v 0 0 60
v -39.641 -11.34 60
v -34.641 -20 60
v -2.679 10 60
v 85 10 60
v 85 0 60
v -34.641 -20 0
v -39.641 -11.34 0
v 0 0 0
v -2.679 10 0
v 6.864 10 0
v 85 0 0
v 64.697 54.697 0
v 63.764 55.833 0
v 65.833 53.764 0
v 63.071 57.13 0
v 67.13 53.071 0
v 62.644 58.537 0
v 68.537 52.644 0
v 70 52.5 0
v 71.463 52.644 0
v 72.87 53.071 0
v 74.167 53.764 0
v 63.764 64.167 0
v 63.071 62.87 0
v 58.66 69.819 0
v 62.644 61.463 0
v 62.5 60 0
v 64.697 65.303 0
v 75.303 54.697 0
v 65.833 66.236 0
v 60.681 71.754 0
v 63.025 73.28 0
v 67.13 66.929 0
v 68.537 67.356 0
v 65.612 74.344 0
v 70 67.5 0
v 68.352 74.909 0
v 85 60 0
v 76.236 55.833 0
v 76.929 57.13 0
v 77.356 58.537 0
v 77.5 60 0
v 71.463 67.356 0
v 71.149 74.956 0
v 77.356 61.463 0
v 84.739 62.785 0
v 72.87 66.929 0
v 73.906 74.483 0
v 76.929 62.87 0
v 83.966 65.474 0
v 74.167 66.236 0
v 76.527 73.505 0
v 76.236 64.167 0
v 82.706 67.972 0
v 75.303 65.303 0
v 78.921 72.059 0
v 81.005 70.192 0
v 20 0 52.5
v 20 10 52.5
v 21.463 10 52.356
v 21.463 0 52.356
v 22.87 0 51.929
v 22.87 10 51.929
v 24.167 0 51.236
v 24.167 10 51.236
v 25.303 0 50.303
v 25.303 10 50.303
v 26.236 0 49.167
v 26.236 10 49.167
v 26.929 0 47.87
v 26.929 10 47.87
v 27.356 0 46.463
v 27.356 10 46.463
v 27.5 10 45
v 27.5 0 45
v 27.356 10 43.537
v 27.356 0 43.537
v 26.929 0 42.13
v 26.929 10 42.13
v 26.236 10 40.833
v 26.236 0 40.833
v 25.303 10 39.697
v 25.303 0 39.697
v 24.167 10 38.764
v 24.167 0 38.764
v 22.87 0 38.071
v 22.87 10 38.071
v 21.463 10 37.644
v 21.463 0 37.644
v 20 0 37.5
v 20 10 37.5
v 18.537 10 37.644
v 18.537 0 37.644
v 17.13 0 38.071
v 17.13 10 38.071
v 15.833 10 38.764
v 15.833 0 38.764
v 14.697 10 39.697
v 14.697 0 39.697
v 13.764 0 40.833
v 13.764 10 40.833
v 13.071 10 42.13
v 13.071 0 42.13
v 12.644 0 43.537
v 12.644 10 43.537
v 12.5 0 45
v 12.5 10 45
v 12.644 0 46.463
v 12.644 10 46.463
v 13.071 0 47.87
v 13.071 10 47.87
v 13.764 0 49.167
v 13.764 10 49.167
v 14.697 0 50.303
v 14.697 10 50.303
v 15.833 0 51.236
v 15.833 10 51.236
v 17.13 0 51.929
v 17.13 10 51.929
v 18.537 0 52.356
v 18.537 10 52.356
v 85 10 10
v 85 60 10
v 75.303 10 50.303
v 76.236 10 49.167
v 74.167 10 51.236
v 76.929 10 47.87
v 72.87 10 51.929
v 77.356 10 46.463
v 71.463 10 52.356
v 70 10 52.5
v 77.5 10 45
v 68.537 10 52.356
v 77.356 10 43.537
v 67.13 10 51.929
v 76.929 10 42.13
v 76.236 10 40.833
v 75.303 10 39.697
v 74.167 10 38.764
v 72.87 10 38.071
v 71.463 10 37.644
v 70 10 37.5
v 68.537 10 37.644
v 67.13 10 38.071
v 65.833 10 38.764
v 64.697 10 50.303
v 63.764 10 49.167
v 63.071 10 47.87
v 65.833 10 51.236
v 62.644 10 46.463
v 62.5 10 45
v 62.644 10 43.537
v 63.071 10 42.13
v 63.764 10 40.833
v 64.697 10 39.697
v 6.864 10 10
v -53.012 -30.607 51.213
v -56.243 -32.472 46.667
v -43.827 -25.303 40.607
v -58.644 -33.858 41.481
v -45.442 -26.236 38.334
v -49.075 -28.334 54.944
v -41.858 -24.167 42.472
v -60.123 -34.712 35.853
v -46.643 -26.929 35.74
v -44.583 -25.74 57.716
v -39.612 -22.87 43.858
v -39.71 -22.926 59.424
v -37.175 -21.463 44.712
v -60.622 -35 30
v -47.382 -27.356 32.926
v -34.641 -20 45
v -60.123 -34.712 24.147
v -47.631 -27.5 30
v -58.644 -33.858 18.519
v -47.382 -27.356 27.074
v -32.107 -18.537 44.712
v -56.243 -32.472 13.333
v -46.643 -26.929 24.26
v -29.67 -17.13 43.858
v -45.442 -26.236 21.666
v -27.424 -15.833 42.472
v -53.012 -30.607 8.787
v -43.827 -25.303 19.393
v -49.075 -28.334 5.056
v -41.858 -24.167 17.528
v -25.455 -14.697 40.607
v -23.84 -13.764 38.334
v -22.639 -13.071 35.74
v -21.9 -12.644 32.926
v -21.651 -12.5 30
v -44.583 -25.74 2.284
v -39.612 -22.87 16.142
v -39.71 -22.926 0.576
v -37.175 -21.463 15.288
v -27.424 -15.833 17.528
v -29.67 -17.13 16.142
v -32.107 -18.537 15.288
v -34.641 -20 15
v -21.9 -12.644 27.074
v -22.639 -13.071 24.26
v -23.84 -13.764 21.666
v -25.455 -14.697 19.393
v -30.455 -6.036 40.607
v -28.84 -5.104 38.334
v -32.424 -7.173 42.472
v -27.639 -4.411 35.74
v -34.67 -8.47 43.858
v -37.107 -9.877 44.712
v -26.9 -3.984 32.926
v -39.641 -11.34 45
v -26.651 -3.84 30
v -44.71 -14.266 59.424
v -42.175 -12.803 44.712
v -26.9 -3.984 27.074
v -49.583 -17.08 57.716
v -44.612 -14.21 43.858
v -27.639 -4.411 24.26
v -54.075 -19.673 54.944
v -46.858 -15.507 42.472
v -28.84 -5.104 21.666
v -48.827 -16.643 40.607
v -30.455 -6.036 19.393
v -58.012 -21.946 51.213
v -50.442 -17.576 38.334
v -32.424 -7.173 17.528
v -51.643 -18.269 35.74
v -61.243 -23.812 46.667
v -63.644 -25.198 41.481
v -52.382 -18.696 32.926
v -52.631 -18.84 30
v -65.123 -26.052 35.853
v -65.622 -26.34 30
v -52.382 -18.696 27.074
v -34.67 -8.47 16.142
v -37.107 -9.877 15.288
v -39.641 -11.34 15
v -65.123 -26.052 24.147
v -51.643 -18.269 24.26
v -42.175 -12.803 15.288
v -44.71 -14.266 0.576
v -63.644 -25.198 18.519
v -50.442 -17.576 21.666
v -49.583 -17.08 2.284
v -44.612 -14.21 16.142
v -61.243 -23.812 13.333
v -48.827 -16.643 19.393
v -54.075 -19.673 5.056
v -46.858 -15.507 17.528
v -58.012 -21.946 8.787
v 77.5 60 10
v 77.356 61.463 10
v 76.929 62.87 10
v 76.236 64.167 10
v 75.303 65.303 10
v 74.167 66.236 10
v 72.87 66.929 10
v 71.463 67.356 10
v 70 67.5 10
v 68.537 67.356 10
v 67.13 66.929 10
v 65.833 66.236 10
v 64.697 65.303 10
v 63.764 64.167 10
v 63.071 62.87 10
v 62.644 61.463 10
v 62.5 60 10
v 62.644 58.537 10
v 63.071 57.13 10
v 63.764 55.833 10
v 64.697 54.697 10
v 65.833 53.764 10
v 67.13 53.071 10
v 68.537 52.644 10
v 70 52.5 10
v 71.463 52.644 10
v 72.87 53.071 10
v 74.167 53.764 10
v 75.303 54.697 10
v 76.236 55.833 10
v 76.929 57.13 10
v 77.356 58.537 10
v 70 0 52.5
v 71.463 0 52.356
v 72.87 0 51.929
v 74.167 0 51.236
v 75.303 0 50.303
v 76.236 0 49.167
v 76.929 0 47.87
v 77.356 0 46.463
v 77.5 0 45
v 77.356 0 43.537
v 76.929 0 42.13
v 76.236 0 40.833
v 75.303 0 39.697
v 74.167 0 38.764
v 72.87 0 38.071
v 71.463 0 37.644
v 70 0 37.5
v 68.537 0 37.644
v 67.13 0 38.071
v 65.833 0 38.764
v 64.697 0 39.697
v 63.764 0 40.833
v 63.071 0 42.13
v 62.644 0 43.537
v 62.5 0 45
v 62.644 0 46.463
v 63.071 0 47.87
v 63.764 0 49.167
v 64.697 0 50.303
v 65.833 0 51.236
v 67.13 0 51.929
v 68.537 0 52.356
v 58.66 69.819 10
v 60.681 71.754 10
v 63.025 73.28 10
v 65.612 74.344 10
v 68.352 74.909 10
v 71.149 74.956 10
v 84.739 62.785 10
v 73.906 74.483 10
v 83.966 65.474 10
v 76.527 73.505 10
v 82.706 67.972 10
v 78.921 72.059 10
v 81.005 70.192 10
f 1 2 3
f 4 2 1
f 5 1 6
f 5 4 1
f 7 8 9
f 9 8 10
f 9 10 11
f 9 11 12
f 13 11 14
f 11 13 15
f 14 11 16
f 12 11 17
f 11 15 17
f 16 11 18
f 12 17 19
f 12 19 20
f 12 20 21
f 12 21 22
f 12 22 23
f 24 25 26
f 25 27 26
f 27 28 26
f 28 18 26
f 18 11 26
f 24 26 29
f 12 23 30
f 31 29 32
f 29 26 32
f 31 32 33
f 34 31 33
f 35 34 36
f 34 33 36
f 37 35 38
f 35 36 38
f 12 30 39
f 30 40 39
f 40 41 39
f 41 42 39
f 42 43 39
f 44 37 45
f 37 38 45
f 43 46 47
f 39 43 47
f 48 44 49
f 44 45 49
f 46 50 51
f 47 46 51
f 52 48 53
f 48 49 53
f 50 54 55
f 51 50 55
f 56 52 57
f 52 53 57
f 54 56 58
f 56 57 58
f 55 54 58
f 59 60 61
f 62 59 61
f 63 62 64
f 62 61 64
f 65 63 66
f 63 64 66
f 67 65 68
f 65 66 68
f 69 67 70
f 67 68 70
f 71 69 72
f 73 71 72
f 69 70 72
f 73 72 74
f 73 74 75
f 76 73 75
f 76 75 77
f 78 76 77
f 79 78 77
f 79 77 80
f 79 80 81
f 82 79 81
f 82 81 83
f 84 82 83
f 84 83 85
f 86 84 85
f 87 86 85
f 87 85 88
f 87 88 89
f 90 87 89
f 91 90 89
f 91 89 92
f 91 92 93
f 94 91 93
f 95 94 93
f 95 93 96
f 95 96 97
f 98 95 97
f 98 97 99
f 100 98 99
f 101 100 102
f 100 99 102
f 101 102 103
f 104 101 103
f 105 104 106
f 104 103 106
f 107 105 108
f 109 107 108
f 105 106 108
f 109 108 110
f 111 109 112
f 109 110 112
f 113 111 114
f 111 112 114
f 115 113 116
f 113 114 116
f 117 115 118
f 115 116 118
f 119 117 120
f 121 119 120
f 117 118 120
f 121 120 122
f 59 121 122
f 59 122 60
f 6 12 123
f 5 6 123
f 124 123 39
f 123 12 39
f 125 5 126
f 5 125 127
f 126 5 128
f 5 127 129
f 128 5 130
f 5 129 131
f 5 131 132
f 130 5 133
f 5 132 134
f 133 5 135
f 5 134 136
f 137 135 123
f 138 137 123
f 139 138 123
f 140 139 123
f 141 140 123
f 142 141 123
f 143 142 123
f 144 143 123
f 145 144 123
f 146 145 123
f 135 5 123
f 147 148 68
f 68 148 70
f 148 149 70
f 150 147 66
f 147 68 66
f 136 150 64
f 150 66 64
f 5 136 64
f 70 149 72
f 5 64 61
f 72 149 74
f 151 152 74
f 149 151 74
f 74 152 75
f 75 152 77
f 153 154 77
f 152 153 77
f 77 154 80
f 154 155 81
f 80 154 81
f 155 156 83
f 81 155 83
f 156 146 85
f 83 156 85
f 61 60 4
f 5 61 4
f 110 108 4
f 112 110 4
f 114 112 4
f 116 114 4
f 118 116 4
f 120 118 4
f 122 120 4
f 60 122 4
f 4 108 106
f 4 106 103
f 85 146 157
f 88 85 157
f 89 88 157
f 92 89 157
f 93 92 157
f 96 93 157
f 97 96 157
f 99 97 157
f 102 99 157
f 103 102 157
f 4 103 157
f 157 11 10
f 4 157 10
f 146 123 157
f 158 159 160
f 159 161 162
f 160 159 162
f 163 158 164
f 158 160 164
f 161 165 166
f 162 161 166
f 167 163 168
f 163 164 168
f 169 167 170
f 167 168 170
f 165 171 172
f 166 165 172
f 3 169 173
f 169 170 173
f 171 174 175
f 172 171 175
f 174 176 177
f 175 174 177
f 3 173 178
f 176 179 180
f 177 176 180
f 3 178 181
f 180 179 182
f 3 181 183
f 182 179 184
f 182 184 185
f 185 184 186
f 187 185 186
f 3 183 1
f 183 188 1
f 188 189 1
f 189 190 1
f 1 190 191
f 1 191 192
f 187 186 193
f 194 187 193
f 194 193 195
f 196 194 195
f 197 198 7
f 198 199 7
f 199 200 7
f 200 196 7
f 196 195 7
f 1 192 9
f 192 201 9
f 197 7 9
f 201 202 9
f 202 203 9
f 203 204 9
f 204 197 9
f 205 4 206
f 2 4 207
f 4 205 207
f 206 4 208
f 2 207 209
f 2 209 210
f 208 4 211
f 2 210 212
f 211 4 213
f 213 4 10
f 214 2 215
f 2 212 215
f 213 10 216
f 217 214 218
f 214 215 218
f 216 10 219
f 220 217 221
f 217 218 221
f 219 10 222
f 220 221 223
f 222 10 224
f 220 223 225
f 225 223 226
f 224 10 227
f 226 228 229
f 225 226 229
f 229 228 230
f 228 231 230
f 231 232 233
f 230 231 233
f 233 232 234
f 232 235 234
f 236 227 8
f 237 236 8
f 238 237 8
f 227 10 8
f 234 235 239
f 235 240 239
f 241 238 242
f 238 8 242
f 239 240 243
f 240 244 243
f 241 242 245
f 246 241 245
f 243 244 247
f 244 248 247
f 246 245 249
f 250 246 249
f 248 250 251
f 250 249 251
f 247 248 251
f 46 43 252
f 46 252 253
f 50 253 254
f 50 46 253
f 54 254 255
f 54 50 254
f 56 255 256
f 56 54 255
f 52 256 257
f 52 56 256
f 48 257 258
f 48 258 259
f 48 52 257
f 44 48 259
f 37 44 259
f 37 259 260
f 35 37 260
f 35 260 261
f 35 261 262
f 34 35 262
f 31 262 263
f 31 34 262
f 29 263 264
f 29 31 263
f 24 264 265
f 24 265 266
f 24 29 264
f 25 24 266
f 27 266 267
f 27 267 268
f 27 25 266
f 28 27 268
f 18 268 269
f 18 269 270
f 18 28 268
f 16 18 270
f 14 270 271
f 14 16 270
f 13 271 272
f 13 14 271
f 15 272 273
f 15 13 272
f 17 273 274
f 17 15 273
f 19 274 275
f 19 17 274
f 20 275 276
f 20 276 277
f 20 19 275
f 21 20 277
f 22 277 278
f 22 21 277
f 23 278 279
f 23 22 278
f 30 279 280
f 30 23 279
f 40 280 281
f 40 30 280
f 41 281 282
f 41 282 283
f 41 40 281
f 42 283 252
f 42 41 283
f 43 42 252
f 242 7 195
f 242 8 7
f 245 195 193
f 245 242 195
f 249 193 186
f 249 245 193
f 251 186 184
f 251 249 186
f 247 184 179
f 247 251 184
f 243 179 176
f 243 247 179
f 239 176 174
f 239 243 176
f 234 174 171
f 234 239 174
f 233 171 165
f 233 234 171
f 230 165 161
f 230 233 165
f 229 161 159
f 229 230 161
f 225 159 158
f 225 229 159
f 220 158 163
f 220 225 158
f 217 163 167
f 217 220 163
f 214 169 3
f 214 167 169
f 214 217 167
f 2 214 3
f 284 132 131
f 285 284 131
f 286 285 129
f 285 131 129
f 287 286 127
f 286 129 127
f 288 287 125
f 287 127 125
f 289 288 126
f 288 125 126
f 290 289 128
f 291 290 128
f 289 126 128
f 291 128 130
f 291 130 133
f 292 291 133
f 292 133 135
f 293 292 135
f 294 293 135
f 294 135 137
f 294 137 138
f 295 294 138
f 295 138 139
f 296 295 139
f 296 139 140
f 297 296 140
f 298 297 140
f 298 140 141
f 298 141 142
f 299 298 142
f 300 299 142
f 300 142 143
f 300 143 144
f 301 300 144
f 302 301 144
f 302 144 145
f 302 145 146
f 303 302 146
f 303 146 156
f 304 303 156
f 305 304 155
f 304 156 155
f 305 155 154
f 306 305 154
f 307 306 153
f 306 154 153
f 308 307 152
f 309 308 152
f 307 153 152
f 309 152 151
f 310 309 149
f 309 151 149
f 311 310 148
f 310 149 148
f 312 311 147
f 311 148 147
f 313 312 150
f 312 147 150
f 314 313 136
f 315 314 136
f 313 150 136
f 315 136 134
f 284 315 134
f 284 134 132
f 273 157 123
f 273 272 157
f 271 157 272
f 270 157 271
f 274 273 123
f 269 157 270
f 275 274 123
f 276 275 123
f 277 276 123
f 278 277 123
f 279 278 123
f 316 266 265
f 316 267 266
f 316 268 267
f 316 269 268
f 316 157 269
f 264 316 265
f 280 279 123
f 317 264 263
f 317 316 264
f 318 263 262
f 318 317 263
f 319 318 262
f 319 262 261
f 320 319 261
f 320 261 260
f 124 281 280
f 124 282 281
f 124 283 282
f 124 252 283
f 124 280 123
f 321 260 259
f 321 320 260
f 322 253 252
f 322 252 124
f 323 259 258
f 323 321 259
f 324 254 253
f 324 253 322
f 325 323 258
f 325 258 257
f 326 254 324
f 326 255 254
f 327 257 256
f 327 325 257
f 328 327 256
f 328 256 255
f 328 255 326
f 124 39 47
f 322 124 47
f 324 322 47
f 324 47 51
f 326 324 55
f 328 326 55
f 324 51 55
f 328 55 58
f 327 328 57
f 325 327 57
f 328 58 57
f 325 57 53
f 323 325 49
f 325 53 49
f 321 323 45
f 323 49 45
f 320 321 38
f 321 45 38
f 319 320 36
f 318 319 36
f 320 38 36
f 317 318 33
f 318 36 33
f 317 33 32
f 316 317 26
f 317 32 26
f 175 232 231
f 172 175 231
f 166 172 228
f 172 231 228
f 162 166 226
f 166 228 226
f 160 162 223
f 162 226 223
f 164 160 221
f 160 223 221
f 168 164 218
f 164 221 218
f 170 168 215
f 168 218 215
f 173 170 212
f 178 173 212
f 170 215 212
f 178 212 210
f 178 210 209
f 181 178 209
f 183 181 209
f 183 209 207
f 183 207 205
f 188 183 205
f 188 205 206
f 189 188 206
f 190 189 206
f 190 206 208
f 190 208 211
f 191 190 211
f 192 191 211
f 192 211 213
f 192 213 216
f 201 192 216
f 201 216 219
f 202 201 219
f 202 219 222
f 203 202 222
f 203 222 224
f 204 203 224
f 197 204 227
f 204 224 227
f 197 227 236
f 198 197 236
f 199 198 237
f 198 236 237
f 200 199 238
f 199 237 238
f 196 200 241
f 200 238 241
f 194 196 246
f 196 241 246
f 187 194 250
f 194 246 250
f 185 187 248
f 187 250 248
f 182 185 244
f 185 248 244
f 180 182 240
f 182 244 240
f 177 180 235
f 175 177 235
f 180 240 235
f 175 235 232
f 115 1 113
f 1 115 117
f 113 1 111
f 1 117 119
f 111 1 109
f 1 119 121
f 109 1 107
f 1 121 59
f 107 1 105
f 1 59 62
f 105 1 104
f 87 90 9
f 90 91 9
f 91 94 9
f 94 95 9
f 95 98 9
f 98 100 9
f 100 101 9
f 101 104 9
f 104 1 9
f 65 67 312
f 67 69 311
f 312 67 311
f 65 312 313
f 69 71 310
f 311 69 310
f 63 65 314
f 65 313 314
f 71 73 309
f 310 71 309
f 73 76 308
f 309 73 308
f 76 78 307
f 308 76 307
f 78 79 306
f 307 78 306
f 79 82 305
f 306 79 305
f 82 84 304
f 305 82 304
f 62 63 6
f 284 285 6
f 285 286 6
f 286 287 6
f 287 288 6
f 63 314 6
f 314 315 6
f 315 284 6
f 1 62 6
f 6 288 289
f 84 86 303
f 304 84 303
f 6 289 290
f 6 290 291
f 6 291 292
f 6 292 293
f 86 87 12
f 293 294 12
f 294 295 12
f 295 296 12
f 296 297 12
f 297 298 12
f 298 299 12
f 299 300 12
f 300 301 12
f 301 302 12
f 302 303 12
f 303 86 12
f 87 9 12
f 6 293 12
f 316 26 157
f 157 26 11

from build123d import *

# Parameters (mm, degrees)
BOSS_EXTRUDE1_DEPTH = 60
SKETCH1_3_R         = 7.5
BOSS_EXTRUDE2_DEPTH = 10
SKETCH2_R           = 7.5
CUT_EXTRUDE1_DEPTH  = 123.678441464
FILLET1_RADIUS      = 30
FILLET1_LENGTH      = 10
SKETCH3_R           = 15
CUT_EXTRUDE2_DEPTH  = 127.889565743


with BuildPart() as part:
    # Sketch1 → Boss-Extrude1 (new body)
    with BuildSketch(Plane.XY):
        Polygon((0, 0), (85, 0), (85, 10), (-2.679491924, 10), (-65.621778265, -26.339745962), (-60.621778265, -35), align=None)
    extrude(amount=BOSS_EXTRUDE1_DEPTH)

    # Sketch1<3> → Boss-Extrude2 (add)
    with BuildSketch(Plane.XY):
        with BuildLine():
            Line((6.864064603, 10), (85, 10))
            Line((85, 10), (85, 60))
            ThreePointArc((85, 60), (75.23946894, 74.055175745), (58.660271303, 69.818887568))
            Line((58.660271303, 69.818887568), (6.864064603, 10))
        make_face()
        with Locations((70, 60)):
            Circle(SKETCH1_3_R, mode=Mode.SUBTRACT)
    extrude(amount=BOSS_EXTRUDE2_DEPTH)

    # Sketch2 → Cut-Extrude1 (cut, through all)
    with BuildSketch(Plane(origin=(0, 10, 0), x_dir=(1, 0, 0), z_dir=(0, 1, 0))):
        with Locations(Location((20, -45, 0), (0, 0, 270))):
            Circle(SKETCH2_R)
        with Locations(Location((70, -45, 0), (0, 0, 270))):
            Circle(SKETCH2_R)
    extrude(amount=-CUT_EXTRUDE1_DEPTH, mode=Mode.SUBTRACT)

    # Fillet1: full round fillet: the end face becomes a half cylinder, R = half its width
    fillet1_face = Plane((-63.121778265, -30.669872981, 30), x_dir=(-0.5, 0.866025403784, 0), z_dir=(-0.866025403784, -0.5, 0))  # on the end face: x along it, z out of the body
    fillet1_slab = fillet1_face.offset(-FILLET1_RADIUS / 2) * Box(FILLET1_LENGTH, 2 * FILLET1_RADIUS, FILLET1_RADIUS, mode=Mode.PRIVATE)  # the body's end, R deep
    fillet1_round = Plane((-37.141016151, -15.669872981, 30), x_dir=(-0.866025403784, -0.5, 0), z_dir=(-0.5, 0.866025403784, 0)) * Cylinder(FILLET1_RADIUS, FILLET1_LENGTH, mode=Mode.PRIVATE)  # its axis R under the face
    add(fillet1_slab - fillet1_round, mode=Mode.SUBTRACT)

    # Sketch3 → Cut-Extrude2 (cut, through all)
    with BuildSketch(Plane(origin=(-5, 8.660254038, 0), x_dir=(0.8660254037844345, 0.5000000000000073, 0), z_dir=(-0.5000000000000073, 0.8660254037844345, 0))):
        with Locations(Location((-40, -30, 0), (0, 0, 180))):
            Circle(SKETCH3_R)
    extrude(amount=-CUT_EXTRUDE2_DEPTH, mode=Mode.SUBTRACT)


solid = part.part
